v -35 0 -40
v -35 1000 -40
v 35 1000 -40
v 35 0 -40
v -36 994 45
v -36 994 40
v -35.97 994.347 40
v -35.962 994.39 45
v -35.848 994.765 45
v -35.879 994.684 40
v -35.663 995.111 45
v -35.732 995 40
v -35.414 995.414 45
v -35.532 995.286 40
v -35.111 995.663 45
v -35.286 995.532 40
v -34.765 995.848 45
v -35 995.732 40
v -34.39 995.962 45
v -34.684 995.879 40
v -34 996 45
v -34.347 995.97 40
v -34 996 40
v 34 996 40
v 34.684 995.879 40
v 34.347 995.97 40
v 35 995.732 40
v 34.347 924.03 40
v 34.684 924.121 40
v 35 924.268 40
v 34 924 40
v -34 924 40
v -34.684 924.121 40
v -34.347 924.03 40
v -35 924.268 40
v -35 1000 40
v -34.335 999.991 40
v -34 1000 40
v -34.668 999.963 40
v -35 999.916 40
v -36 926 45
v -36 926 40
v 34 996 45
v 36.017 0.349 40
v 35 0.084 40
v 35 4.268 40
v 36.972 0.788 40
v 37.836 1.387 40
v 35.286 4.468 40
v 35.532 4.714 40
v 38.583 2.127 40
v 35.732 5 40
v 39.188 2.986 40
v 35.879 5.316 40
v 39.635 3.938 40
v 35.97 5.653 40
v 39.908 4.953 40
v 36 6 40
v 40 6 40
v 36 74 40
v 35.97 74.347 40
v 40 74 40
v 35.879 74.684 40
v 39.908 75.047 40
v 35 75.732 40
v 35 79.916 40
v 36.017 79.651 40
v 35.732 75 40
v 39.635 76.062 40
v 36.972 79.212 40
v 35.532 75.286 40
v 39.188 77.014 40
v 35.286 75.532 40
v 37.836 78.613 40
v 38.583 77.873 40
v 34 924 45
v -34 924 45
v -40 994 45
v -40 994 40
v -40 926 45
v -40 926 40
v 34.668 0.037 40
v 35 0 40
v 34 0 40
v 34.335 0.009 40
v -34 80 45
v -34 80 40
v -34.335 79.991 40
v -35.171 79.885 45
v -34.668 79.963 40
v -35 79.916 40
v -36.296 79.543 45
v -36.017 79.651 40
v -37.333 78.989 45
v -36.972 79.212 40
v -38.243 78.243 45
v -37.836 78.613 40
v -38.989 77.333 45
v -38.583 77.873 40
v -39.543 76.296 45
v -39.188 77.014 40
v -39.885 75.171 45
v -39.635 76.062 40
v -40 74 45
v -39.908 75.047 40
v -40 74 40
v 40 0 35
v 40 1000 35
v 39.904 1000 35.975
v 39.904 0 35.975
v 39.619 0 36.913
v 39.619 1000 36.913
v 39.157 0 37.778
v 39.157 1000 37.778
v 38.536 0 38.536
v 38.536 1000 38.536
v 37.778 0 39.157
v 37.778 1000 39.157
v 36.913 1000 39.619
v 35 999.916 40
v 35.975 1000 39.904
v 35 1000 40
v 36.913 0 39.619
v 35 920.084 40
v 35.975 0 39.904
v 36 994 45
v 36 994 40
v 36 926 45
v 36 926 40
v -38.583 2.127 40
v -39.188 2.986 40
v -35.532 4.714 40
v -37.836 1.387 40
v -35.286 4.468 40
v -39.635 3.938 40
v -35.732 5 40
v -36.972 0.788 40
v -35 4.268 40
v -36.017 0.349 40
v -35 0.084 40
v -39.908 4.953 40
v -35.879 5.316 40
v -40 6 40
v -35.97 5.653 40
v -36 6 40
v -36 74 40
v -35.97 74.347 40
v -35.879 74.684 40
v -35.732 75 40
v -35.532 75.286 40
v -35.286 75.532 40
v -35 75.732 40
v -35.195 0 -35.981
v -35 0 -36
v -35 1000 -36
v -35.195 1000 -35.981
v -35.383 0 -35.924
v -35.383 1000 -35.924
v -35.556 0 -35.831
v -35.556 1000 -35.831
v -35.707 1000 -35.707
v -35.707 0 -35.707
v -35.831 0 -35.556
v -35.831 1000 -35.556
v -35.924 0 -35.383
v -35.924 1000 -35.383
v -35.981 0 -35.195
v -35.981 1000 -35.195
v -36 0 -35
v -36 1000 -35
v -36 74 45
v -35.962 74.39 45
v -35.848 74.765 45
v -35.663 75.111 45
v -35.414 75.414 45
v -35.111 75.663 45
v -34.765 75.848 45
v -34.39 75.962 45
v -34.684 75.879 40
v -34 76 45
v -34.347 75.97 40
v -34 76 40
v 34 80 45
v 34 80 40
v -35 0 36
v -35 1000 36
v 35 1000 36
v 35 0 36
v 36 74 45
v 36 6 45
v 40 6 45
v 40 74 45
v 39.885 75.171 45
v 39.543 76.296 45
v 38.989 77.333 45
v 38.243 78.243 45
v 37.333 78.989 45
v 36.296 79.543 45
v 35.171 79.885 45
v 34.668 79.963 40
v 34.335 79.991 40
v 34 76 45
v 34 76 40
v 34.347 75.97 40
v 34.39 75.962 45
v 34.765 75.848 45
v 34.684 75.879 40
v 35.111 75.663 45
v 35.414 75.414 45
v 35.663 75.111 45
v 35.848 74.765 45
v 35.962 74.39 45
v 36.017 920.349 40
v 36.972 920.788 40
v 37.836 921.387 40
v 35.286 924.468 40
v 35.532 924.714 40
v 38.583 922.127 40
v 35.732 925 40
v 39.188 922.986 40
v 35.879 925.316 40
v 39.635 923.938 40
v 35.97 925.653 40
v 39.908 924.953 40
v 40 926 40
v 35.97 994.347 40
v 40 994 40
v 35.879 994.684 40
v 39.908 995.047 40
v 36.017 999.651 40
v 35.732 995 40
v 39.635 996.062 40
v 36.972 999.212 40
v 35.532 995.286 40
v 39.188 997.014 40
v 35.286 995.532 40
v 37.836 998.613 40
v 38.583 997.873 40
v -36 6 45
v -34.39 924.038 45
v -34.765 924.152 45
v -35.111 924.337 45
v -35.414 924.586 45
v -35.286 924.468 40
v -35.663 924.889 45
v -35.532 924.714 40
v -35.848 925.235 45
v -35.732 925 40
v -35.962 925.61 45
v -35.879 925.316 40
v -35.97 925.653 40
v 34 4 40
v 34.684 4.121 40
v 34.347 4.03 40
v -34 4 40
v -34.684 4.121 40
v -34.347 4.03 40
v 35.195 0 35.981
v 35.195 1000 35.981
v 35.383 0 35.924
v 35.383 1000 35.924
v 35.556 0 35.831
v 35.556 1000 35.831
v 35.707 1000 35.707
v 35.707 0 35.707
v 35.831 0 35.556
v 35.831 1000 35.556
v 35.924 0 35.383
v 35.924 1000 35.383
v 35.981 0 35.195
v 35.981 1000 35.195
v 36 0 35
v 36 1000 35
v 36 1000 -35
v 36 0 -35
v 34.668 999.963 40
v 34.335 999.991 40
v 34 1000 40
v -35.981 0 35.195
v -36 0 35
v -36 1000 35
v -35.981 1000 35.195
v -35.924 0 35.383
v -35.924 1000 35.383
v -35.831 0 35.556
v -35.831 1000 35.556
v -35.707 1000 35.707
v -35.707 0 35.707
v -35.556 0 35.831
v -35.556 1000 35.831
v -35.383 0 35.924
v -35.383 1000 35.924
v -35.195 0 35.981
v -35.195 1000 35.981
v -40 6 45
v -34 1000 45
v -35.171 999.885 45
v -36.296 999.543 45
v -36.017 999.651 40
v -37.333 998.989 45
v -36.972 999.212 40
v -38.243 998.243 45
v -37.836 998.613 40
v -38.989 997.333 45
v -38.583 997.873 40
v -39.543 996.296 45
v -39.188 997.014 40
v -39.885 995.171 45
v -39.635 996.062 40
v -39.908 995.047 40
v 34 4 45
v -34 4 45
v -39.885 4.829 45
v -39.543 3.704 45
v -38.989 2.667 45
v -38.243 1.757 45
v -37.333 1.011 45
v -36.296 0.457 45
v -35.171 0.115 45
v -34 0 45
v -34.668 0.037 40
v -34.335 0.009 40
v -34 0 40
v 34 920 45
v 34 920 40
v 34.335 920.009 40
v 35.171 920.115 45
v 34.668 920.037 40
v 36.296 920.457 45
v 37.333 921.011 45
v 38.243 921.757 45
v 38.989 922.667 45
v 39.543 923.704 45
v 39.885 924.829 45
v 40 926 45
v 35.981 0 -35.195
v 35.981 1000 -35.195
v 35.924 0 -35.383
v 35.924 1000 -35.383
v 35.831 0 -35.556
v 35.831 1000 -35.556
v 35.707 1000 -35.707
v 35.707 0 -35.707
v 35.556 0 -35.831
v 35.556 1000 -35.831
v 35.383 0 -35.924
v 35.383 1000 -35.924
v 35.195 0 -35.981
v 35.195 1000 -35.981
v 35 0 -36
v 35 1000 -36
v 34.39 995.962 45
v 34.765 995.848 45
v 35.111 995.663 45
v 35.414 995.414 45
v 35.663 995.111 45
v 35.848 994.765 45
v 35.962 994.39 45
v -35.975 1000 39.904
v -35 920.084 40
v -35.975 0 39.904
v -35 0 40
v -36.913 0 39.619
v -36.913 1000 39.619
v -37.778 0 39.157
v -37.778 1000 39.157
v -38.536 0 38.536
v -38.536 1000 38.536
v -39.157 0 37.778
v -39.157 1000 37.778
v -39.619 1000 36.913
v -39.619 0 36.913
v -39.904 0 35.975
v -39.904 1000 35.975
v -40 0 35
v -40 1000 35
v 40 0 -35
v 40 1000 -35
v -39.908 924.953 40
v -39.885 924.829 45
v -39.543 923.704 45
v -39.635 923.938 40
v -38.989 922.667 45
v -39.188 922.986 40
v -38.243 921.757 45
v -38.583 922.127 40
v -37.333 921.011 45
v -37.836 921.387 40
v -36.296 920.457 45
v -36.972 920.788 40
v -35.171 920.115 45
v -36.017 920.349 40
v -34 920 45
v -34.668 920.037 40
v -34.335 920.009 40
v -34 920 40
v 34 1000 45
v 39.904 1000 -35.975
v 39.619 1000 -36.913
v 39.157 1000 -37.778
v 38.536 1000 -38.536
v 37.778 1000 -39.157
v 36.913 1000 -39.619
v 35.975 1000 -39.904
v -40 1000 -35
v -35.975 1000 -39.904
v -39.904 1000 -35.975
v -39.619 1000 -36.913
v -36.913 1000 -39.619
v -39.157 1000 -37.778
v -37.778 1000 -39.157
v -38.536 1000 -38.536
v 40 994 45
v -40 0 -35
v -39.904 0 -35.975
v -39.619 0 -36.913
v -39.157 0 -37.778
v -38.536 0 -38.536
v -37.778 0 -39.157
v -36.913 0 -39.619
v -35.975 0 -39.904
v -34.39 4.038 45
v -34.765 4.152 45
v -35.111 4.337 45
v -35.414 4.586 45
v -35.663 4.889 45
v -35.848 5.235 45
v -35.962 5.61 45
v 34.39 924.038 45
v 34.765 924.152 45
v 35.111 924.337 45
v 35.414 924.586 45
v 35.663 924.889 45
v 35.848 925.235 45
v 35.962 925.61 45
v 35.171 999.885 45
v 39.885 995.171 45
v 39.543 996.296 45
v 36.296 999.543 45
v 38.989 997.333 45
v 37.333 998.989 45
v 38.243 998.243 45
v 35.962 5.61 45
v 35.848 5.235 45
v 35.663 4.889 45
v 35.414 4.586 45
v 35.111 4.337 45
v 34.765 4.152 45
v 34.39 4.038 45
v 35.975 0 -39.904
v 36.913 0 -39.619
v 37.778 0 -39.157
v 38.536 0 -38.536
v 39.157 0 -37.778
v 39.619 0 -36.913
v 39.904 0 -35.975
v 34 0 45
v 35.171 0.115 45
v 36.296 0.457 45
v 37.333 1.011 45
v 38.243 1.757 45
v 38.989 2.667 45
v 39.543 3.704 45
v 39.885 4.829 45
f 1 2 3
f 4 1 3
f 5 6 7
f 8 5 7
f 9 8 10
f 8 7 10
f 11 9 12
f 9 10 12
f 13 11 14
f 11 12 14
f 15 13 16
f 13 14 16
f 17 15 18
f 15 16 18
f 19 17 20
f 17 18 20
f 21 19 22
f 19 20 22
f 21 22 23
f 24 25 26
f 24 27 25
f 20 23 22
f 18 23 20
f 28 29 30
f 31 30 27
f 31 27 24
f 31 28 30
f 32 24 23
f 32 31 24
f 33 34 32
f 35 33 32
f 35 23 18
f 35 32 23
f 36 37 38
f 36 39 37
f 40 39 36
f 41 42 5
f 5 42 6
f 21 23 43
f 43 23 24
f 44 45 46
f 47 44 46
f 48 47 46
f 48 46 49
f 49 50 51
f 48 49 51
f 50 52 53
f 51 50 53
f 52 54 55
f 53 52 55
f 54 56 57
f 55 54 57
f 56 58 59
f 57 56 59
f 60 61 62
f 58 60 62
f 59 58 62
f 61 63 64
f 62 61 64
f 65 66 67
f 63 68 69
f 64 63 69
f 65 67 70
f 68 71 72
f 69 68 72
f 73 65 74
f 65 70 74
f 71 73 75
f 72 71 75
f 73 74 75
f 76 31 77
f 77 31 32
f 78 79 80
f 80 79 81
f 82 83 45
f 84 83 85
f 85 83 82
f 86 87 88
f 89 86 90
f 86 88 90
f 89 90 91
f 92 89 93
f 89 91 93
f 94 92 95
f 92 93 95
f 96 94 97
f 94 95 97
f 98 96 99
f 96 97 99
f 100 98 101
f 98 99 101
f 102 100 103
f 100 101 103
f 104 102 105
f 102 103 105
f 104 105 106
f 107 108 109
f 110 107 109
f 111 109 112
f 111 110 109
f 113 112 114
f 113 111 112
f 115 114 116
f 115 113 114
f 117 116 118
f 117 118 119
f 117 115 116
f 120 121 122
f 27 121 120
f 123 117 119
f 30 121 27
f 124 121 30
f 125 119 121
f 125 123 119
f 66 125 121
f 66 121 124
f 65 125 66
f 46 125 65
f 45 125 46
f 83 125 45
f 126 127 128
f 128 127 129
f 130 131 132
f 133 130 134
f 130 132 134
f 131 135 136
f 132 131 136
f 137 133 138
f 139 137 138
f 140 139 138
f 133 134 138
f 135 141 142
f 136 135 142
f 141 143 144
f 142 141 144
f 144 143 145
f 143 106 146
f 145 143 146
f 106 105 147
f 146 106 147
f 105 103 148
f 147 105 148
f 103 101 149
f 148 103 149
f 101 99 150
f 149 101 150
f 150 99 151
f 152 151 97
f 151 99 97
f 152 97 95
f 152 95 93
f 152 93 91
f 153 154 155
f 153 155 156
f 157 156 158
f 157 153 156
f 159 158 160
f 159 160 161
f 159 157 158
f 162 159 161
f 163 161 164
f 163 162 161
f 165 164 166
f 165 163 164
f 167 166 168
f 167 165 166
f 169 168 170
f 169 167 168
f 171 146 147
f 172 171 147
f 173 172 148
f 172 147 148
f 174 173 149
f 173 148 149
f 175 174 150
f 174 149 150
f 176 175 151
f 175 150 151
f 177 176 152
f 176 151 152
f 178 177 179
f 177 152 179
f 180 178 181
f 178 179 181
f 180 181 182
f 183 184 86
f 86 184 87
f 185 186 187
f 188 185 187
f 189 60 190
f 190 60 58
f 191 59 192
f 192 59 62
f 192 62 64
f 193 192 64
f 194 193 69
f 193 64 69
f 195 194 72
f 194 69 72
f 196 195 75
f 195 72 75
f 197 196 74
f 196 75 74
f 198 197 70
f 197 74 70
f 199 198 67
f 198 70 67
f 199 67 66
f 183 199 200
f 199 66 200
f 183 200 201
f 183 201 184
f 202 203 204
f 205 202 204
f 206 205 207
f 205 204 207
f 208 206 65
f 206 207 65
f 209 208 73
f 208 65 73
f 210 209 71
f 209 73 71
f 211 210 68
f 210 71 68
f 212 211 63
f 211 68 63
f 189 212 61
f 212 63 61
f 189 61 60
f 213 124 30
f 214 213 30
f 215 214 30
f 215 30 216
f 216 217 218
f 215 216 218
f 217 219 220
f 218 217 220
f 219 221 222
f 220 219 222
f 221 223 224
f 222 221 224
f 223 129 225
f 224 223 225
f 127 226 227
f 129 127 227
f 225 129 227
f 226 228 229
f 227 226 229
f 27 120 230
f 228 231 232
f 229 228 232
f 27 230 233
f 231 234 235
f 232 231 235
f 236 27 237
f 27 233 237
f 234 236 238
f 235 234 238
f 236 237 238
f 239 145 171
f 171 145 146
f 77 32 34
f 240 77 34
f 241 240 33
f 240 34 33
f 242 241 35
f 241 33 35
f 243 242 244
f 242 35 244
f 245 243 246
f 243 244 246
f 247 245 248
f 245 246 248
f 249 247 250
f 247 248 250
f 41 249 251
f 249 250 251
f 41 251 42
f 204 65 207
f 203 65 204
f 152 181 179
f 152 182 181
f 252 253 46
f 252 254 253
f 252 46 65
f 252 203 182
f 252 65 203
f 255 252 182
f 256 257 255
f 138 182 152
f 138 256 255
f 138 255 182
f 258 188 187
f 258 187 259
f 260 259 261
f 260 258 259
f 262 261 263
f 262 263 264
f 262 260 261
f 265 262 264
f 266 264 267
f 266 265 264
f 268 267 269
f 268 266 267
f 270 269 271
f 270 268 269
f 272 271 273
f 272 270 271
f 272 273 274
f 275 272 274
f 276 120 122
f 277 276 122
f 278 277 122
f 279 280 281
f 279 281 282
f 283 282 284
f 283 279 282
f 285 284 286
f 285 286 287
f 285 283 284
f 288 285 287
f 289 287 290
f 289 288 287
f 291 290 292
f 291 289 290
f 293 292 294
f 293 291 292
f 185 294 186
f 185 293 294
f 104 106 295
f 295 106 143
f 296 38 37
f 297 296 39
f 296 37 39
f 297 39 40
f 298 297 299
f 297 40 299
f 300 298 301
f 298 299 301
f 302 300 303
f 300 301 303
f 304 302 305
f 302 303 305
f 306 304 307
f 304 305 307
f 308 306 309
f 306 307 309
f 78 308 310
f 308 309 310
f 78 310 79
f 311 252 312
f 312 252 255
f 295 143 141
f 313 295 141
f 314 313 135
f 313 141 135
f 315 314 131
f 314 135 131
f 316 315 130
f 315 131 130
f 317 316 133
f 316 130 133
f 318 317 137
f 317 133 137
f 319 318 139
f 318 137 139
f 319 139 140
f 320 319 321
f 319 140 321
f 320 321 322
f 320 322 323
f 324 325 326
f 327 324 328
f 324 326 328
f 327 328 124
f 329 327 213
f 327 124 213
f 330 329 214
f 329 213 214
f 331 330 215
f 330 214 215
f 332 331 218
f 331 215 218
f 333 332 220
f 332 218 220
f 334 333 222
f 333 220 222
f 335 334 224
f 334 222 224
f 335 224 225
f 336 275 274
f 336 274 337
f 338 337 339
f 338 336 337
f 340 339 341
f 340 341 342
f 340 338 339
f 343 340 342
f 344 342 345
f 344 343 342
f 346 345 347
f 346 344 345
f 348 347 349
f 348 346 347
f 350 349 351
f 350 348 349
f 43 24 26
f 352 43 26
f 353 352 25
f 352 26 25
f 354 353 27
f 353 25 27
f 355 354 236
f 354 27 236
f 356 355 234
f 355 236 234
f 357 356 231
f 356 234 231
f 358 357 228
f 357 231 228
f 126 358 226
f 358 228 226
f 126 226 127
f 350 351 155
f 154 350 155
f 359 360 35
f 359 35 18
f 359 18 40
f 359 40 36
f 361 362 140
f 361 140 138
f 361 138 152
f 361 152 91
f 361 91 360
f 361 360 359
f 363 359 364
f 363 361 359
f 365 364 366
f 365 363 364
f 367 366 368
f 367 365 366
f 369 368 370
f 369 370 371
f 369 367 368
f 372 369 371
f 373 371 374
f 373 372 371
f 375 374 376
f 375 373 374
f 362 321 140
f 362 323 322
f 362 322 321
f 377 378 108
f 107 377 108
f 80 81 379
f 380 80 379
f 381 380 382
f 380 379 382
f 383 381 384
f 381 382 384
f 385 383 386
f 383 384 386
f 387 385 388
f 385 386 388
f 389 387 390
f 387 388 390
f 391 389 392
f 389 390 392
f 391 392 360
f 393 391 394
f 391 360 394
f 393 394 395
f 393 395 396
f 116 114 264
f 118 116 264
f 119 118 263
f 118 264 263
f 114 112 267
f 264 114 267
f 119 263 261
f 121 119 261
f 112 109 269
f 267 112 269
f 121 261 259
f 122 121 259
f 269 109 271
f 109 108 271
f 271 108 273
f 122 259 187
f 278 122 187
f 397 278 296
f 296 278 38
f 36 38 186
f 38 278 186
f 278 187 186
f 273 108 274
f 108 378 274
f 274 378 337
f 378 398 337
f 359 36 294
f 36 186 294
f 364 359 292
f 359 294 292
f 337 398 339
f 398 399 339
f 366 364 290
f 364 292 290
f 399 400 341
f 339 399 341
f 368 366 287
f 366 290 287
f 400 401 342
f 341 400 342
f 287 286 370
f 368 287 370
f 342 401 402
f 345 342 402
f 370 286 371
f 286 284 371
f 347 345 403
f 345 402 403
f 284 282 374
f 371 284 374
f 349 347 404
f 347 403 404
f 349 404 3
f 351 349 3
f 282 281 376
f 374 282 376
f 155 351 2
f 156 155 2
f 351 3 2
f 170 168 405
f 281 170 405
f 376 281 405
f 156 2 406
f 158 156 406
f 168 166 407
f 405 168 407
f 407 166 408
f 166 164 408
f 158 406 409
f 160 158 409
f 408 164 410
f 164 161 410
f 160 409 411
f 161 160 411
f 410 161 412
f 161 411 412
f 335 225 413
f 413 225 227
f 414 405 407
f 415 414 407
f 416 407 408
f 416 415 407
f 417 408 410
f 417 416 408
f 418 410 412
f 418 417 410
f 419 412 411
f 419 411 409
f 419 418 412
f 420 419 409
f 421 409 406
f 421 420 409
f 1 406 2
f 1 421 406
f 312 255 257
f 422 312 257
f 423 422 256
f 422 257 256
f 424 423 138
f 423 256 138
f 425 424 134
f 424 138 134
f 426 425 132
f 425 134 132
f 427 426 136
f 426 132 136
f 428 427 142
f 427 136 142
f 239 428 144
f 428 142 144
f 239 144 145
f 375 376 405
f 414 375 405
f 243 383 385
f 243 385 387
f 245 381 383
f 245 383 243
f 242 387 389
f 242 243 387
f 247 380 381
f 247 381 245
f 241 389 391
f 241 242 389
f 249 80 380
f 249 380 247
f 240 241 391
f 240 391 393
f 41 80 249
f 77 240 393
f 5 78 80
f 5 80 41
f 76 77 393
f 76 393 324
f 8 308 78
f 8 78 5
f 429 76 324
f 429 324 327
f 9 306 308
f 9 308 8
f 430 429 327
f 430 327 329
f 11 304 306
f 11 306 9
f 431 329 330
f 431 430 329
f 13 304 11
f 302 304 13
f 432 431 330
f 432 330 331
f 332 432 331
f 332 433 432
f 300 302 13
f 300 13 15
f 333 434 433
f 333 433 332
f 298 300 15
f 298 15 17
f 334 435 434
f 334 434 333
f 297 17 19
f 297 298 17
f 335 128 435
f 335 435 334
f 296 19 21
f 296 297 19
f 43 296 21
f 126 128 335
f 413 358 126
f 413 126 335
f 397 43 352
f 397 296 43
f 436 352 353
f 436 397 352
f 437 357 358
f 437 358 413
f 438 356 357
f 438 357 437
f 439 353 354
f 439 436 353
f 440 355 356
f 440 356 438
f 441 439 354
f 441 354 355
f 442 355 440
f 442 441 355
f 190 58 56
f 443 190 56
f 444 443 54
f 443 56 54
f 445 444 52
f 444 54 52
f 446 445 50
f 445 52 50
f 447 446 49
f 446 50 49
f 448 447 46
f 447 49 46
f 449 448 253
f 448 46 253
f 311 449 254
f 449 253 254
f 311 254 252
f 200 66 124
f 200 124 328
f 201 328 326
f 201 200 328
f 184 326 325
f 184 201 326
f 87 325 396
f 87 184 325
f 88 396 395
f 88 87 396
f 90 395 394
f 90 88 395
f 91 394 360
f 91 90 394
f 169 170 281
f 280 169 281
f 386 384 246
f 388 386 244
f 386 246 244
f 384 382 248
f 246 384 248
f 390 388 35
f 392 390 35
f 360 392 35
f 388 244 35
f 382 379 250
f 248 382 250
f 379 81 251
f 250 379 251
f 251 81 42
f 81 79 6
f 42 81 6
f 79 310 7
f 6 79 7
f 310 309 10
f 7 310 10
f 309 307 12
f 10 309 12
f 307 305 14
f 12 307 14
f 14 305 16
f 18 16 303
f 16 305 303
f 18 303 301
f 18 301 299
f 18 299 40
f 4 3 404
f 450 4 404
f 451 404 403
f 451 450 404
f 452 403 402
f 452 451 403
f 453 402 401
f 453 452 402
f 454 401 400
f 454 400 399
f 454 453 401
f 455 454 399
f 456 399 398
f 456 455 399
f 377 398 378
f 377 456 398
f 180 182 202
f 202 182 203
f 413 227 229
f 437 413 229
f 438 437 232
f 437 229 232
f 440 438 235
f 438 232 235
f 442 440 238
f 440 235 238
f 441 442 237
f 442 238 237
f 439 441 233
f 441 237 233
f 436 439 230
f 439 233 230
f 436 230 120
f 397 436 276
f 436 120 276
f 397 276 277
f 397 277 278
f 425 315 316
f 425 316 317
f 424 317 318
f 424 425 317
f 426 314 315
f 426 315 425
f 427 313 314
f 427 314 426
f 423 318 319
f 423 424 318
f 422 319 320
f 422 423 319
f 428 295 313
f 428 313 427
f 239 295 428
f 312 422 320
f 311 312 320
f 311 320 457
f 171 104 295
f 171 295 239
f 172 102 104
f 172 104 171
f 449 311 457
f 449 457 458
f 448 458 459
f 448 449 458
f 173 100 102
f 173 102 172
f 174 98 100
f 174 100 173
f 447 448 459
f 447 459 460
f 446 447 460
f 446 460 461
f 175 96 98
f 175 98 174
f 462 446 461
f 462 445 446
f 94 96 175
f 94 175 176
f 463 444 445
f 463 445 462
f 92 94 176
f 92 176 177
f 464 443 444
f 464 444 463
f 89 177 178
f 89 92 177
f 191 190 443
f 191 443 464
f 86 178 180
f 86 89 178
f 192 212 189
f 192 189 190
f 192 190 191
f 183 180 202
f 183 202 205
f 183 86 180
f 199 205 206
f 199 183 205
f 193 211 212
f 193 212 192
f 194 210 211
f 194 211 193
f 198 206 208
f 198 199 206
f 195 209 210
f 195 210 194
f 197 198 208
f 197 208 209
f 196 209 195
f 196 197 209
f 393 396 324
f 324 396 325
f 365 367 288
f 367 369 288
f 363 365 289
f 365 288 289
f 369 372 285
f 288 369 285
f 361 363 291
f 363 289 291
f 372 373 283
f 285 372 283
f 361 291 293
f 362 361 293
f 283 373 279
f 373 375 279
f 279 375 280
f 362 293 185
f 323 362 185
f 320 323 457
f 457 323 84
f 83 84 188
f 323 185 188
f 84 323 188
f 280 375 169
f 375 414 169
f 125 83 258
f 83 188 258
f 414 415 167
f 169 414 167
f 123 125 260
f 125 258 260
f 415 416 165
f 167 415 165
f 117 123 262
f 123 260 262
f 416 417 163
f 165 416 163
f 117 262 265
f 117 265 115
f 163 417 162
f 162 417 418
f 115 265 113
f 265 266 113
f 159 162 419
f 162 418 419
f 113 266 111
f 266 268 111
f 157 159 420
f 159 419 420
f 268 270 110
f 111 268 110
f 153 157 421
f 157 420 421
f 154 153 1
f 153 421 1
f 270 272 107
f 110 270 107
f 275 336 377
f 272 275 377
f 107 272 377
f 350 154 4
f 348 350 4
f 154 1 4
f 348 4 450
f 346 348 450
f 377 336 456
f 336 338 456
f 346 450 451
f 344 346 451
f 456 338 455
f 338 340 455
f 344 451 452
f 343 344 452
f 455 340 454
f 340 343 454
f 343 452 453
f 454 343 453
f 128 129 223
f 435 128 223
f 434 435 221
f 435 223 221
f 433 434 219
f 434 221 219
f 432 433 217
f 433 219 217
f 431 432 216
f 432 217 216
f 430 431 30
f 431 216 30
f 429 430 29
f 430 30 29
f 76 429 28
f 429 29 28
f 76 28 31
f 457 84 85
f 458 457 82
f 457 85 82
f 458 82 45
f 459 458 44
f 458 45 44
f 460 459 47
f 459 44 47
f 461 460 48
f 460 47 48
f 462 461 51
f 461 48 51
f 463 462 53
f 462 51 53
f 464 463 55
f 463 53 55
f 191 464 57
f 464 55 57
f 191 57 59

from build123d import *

# Parameters (mm, degrees)
F1_DEPTH = 1000
F3_DEPTH = 5
F5_DEPTH = 5


with BuildPart() as f1:
    # F0 (on Front) → F1 (new body)
    with BuildSketch(Plane.XZ):
        with BuildLine():
            ThreePointArc((40, 35), (38.535534, 38.535534), (35, 40))
            Line((35, 40), (-35, 40))
            ThreePointArc((-35, 40), (-38.535534, 38.535534), (-40, 35))
            Line((-40, 35), (-40, -35))
            ThreePointArc((-40, -35), (-38.535534, -38.535534), (-35, -40))
            Line((-35, -40), (35, -40))
            ThreePointArc((35, -40), (38.535534, -38.535534), (40, -35))
            Line((40, -35), (40, 35))
        make_face()
        with BuildLine():
            ThreePointArc((-36, 35), (-35.707107, 35.707107), (-35, 36))
            Line((-35, 36), (35, 36))
            ThreePointArc((35, 36), (35.707107, 35.707107), (36, 35))
            Line((36, 35), (36, -35))
            ThreePointArc((36, -35), (35.707107, -35.707107), (35, -36))
            Line((35, -36), (-35, -36))
            ThreePointArc((-35, -36), (-35.707107, -35.707107), (-36, -35))
            Line((-36, -35), (-36, 35))
        make_face(mode=Mode.SUBTRACT)
    extrude(amount=-F1_DEPTH)

    # F2 (on face) → F3 (join)
    with BuildSketch(Plane.XY.offset(40)):
        with BuildLine():
            ThreePointArc((40, 74), (38.242641, 78.242641), (34, 80))
            Line((34, 80), (-34, 80))
            ThreePointArc((-34, 80), (-38.242641, 78.242641), (-40, 74))
            Line((-40, 74), (-40, 6))
            ThreePointArc((-40, 6), (-38.242641, 1.757359), (-34, 0))
            Line((-34, 0), (34, 0))
            ThreePointArc((34, 0), (38.242641, 1.757359), (40, 6))
            Line((40, 6), (40, 74))
        make_face()
        with BuildLine():
            ThreePointArc((34, 76), (35.414214, 75.414214), (36, 74))
            Line((36, 74), (36, 6))
            ThreePointArc((36, 6), (35.414214, 4.585786), (34, 4))
            Line((34, 4), (-34, 4))
            ThreePointArc((-34, 4), (-35.414214, 4.585786), (-36, 6))
            Line((-36, 6), (-36, 74))
            ThreePointArc((-36, 74), (-35.414214, 75.414214), (-34, 76))
            Line((-34, 76), (34, 76))
        make_face(mode=Mode.SUBTRACT)
    extrude(amount=F3_DEPTH)

    # F4 (on face) → F5 (join)
    with BuildSketch(Plane.XY.offset(40)):
        with BuildLine():
            ThreePointArc((40, 994), (38.242641, 998.242641), (34, 1000))
            Line((34, 1000), (-34, 1000))
            ThreePointArc((-34, 1000), (-38.242641, 998.242641), (-40, 994))
            Line((-40, 994), (-40, 926))
            ThreePointArc((-40, 926), (-38.242641, 921.757359), (-34, 920))
            Line((-34, 920), (34, 920))
            ThreePointArc((34, 920), (38.242641, 921.757359), (40, 926))
            Line((40, 926), (40, 994))
        make_face()
        with BuildLine():
            ThreePointArc((34, 996), (35.414214, 995.414214), (36, 994))
            Line((36, 994), (36, 926))
            ThreePointArc((36, 926), (35.414214, 924.585786), (34, 924))
            Line((34, 924), (-34, 924))
            ThreePointArc((-34, 924), (-35.414214, 924.585786), (-36, 926))
            Line((-36, 926), (-36, 994))
            ThreePointArc((-36, 994), (-35.414214, 995.414214), (-34, 996))
            Line((-34, 996), (34, 996))
        make_face(mode=Mode.SUBTRACT)
    extrude(amount=F5_DEPTH)


solid = f1.part
